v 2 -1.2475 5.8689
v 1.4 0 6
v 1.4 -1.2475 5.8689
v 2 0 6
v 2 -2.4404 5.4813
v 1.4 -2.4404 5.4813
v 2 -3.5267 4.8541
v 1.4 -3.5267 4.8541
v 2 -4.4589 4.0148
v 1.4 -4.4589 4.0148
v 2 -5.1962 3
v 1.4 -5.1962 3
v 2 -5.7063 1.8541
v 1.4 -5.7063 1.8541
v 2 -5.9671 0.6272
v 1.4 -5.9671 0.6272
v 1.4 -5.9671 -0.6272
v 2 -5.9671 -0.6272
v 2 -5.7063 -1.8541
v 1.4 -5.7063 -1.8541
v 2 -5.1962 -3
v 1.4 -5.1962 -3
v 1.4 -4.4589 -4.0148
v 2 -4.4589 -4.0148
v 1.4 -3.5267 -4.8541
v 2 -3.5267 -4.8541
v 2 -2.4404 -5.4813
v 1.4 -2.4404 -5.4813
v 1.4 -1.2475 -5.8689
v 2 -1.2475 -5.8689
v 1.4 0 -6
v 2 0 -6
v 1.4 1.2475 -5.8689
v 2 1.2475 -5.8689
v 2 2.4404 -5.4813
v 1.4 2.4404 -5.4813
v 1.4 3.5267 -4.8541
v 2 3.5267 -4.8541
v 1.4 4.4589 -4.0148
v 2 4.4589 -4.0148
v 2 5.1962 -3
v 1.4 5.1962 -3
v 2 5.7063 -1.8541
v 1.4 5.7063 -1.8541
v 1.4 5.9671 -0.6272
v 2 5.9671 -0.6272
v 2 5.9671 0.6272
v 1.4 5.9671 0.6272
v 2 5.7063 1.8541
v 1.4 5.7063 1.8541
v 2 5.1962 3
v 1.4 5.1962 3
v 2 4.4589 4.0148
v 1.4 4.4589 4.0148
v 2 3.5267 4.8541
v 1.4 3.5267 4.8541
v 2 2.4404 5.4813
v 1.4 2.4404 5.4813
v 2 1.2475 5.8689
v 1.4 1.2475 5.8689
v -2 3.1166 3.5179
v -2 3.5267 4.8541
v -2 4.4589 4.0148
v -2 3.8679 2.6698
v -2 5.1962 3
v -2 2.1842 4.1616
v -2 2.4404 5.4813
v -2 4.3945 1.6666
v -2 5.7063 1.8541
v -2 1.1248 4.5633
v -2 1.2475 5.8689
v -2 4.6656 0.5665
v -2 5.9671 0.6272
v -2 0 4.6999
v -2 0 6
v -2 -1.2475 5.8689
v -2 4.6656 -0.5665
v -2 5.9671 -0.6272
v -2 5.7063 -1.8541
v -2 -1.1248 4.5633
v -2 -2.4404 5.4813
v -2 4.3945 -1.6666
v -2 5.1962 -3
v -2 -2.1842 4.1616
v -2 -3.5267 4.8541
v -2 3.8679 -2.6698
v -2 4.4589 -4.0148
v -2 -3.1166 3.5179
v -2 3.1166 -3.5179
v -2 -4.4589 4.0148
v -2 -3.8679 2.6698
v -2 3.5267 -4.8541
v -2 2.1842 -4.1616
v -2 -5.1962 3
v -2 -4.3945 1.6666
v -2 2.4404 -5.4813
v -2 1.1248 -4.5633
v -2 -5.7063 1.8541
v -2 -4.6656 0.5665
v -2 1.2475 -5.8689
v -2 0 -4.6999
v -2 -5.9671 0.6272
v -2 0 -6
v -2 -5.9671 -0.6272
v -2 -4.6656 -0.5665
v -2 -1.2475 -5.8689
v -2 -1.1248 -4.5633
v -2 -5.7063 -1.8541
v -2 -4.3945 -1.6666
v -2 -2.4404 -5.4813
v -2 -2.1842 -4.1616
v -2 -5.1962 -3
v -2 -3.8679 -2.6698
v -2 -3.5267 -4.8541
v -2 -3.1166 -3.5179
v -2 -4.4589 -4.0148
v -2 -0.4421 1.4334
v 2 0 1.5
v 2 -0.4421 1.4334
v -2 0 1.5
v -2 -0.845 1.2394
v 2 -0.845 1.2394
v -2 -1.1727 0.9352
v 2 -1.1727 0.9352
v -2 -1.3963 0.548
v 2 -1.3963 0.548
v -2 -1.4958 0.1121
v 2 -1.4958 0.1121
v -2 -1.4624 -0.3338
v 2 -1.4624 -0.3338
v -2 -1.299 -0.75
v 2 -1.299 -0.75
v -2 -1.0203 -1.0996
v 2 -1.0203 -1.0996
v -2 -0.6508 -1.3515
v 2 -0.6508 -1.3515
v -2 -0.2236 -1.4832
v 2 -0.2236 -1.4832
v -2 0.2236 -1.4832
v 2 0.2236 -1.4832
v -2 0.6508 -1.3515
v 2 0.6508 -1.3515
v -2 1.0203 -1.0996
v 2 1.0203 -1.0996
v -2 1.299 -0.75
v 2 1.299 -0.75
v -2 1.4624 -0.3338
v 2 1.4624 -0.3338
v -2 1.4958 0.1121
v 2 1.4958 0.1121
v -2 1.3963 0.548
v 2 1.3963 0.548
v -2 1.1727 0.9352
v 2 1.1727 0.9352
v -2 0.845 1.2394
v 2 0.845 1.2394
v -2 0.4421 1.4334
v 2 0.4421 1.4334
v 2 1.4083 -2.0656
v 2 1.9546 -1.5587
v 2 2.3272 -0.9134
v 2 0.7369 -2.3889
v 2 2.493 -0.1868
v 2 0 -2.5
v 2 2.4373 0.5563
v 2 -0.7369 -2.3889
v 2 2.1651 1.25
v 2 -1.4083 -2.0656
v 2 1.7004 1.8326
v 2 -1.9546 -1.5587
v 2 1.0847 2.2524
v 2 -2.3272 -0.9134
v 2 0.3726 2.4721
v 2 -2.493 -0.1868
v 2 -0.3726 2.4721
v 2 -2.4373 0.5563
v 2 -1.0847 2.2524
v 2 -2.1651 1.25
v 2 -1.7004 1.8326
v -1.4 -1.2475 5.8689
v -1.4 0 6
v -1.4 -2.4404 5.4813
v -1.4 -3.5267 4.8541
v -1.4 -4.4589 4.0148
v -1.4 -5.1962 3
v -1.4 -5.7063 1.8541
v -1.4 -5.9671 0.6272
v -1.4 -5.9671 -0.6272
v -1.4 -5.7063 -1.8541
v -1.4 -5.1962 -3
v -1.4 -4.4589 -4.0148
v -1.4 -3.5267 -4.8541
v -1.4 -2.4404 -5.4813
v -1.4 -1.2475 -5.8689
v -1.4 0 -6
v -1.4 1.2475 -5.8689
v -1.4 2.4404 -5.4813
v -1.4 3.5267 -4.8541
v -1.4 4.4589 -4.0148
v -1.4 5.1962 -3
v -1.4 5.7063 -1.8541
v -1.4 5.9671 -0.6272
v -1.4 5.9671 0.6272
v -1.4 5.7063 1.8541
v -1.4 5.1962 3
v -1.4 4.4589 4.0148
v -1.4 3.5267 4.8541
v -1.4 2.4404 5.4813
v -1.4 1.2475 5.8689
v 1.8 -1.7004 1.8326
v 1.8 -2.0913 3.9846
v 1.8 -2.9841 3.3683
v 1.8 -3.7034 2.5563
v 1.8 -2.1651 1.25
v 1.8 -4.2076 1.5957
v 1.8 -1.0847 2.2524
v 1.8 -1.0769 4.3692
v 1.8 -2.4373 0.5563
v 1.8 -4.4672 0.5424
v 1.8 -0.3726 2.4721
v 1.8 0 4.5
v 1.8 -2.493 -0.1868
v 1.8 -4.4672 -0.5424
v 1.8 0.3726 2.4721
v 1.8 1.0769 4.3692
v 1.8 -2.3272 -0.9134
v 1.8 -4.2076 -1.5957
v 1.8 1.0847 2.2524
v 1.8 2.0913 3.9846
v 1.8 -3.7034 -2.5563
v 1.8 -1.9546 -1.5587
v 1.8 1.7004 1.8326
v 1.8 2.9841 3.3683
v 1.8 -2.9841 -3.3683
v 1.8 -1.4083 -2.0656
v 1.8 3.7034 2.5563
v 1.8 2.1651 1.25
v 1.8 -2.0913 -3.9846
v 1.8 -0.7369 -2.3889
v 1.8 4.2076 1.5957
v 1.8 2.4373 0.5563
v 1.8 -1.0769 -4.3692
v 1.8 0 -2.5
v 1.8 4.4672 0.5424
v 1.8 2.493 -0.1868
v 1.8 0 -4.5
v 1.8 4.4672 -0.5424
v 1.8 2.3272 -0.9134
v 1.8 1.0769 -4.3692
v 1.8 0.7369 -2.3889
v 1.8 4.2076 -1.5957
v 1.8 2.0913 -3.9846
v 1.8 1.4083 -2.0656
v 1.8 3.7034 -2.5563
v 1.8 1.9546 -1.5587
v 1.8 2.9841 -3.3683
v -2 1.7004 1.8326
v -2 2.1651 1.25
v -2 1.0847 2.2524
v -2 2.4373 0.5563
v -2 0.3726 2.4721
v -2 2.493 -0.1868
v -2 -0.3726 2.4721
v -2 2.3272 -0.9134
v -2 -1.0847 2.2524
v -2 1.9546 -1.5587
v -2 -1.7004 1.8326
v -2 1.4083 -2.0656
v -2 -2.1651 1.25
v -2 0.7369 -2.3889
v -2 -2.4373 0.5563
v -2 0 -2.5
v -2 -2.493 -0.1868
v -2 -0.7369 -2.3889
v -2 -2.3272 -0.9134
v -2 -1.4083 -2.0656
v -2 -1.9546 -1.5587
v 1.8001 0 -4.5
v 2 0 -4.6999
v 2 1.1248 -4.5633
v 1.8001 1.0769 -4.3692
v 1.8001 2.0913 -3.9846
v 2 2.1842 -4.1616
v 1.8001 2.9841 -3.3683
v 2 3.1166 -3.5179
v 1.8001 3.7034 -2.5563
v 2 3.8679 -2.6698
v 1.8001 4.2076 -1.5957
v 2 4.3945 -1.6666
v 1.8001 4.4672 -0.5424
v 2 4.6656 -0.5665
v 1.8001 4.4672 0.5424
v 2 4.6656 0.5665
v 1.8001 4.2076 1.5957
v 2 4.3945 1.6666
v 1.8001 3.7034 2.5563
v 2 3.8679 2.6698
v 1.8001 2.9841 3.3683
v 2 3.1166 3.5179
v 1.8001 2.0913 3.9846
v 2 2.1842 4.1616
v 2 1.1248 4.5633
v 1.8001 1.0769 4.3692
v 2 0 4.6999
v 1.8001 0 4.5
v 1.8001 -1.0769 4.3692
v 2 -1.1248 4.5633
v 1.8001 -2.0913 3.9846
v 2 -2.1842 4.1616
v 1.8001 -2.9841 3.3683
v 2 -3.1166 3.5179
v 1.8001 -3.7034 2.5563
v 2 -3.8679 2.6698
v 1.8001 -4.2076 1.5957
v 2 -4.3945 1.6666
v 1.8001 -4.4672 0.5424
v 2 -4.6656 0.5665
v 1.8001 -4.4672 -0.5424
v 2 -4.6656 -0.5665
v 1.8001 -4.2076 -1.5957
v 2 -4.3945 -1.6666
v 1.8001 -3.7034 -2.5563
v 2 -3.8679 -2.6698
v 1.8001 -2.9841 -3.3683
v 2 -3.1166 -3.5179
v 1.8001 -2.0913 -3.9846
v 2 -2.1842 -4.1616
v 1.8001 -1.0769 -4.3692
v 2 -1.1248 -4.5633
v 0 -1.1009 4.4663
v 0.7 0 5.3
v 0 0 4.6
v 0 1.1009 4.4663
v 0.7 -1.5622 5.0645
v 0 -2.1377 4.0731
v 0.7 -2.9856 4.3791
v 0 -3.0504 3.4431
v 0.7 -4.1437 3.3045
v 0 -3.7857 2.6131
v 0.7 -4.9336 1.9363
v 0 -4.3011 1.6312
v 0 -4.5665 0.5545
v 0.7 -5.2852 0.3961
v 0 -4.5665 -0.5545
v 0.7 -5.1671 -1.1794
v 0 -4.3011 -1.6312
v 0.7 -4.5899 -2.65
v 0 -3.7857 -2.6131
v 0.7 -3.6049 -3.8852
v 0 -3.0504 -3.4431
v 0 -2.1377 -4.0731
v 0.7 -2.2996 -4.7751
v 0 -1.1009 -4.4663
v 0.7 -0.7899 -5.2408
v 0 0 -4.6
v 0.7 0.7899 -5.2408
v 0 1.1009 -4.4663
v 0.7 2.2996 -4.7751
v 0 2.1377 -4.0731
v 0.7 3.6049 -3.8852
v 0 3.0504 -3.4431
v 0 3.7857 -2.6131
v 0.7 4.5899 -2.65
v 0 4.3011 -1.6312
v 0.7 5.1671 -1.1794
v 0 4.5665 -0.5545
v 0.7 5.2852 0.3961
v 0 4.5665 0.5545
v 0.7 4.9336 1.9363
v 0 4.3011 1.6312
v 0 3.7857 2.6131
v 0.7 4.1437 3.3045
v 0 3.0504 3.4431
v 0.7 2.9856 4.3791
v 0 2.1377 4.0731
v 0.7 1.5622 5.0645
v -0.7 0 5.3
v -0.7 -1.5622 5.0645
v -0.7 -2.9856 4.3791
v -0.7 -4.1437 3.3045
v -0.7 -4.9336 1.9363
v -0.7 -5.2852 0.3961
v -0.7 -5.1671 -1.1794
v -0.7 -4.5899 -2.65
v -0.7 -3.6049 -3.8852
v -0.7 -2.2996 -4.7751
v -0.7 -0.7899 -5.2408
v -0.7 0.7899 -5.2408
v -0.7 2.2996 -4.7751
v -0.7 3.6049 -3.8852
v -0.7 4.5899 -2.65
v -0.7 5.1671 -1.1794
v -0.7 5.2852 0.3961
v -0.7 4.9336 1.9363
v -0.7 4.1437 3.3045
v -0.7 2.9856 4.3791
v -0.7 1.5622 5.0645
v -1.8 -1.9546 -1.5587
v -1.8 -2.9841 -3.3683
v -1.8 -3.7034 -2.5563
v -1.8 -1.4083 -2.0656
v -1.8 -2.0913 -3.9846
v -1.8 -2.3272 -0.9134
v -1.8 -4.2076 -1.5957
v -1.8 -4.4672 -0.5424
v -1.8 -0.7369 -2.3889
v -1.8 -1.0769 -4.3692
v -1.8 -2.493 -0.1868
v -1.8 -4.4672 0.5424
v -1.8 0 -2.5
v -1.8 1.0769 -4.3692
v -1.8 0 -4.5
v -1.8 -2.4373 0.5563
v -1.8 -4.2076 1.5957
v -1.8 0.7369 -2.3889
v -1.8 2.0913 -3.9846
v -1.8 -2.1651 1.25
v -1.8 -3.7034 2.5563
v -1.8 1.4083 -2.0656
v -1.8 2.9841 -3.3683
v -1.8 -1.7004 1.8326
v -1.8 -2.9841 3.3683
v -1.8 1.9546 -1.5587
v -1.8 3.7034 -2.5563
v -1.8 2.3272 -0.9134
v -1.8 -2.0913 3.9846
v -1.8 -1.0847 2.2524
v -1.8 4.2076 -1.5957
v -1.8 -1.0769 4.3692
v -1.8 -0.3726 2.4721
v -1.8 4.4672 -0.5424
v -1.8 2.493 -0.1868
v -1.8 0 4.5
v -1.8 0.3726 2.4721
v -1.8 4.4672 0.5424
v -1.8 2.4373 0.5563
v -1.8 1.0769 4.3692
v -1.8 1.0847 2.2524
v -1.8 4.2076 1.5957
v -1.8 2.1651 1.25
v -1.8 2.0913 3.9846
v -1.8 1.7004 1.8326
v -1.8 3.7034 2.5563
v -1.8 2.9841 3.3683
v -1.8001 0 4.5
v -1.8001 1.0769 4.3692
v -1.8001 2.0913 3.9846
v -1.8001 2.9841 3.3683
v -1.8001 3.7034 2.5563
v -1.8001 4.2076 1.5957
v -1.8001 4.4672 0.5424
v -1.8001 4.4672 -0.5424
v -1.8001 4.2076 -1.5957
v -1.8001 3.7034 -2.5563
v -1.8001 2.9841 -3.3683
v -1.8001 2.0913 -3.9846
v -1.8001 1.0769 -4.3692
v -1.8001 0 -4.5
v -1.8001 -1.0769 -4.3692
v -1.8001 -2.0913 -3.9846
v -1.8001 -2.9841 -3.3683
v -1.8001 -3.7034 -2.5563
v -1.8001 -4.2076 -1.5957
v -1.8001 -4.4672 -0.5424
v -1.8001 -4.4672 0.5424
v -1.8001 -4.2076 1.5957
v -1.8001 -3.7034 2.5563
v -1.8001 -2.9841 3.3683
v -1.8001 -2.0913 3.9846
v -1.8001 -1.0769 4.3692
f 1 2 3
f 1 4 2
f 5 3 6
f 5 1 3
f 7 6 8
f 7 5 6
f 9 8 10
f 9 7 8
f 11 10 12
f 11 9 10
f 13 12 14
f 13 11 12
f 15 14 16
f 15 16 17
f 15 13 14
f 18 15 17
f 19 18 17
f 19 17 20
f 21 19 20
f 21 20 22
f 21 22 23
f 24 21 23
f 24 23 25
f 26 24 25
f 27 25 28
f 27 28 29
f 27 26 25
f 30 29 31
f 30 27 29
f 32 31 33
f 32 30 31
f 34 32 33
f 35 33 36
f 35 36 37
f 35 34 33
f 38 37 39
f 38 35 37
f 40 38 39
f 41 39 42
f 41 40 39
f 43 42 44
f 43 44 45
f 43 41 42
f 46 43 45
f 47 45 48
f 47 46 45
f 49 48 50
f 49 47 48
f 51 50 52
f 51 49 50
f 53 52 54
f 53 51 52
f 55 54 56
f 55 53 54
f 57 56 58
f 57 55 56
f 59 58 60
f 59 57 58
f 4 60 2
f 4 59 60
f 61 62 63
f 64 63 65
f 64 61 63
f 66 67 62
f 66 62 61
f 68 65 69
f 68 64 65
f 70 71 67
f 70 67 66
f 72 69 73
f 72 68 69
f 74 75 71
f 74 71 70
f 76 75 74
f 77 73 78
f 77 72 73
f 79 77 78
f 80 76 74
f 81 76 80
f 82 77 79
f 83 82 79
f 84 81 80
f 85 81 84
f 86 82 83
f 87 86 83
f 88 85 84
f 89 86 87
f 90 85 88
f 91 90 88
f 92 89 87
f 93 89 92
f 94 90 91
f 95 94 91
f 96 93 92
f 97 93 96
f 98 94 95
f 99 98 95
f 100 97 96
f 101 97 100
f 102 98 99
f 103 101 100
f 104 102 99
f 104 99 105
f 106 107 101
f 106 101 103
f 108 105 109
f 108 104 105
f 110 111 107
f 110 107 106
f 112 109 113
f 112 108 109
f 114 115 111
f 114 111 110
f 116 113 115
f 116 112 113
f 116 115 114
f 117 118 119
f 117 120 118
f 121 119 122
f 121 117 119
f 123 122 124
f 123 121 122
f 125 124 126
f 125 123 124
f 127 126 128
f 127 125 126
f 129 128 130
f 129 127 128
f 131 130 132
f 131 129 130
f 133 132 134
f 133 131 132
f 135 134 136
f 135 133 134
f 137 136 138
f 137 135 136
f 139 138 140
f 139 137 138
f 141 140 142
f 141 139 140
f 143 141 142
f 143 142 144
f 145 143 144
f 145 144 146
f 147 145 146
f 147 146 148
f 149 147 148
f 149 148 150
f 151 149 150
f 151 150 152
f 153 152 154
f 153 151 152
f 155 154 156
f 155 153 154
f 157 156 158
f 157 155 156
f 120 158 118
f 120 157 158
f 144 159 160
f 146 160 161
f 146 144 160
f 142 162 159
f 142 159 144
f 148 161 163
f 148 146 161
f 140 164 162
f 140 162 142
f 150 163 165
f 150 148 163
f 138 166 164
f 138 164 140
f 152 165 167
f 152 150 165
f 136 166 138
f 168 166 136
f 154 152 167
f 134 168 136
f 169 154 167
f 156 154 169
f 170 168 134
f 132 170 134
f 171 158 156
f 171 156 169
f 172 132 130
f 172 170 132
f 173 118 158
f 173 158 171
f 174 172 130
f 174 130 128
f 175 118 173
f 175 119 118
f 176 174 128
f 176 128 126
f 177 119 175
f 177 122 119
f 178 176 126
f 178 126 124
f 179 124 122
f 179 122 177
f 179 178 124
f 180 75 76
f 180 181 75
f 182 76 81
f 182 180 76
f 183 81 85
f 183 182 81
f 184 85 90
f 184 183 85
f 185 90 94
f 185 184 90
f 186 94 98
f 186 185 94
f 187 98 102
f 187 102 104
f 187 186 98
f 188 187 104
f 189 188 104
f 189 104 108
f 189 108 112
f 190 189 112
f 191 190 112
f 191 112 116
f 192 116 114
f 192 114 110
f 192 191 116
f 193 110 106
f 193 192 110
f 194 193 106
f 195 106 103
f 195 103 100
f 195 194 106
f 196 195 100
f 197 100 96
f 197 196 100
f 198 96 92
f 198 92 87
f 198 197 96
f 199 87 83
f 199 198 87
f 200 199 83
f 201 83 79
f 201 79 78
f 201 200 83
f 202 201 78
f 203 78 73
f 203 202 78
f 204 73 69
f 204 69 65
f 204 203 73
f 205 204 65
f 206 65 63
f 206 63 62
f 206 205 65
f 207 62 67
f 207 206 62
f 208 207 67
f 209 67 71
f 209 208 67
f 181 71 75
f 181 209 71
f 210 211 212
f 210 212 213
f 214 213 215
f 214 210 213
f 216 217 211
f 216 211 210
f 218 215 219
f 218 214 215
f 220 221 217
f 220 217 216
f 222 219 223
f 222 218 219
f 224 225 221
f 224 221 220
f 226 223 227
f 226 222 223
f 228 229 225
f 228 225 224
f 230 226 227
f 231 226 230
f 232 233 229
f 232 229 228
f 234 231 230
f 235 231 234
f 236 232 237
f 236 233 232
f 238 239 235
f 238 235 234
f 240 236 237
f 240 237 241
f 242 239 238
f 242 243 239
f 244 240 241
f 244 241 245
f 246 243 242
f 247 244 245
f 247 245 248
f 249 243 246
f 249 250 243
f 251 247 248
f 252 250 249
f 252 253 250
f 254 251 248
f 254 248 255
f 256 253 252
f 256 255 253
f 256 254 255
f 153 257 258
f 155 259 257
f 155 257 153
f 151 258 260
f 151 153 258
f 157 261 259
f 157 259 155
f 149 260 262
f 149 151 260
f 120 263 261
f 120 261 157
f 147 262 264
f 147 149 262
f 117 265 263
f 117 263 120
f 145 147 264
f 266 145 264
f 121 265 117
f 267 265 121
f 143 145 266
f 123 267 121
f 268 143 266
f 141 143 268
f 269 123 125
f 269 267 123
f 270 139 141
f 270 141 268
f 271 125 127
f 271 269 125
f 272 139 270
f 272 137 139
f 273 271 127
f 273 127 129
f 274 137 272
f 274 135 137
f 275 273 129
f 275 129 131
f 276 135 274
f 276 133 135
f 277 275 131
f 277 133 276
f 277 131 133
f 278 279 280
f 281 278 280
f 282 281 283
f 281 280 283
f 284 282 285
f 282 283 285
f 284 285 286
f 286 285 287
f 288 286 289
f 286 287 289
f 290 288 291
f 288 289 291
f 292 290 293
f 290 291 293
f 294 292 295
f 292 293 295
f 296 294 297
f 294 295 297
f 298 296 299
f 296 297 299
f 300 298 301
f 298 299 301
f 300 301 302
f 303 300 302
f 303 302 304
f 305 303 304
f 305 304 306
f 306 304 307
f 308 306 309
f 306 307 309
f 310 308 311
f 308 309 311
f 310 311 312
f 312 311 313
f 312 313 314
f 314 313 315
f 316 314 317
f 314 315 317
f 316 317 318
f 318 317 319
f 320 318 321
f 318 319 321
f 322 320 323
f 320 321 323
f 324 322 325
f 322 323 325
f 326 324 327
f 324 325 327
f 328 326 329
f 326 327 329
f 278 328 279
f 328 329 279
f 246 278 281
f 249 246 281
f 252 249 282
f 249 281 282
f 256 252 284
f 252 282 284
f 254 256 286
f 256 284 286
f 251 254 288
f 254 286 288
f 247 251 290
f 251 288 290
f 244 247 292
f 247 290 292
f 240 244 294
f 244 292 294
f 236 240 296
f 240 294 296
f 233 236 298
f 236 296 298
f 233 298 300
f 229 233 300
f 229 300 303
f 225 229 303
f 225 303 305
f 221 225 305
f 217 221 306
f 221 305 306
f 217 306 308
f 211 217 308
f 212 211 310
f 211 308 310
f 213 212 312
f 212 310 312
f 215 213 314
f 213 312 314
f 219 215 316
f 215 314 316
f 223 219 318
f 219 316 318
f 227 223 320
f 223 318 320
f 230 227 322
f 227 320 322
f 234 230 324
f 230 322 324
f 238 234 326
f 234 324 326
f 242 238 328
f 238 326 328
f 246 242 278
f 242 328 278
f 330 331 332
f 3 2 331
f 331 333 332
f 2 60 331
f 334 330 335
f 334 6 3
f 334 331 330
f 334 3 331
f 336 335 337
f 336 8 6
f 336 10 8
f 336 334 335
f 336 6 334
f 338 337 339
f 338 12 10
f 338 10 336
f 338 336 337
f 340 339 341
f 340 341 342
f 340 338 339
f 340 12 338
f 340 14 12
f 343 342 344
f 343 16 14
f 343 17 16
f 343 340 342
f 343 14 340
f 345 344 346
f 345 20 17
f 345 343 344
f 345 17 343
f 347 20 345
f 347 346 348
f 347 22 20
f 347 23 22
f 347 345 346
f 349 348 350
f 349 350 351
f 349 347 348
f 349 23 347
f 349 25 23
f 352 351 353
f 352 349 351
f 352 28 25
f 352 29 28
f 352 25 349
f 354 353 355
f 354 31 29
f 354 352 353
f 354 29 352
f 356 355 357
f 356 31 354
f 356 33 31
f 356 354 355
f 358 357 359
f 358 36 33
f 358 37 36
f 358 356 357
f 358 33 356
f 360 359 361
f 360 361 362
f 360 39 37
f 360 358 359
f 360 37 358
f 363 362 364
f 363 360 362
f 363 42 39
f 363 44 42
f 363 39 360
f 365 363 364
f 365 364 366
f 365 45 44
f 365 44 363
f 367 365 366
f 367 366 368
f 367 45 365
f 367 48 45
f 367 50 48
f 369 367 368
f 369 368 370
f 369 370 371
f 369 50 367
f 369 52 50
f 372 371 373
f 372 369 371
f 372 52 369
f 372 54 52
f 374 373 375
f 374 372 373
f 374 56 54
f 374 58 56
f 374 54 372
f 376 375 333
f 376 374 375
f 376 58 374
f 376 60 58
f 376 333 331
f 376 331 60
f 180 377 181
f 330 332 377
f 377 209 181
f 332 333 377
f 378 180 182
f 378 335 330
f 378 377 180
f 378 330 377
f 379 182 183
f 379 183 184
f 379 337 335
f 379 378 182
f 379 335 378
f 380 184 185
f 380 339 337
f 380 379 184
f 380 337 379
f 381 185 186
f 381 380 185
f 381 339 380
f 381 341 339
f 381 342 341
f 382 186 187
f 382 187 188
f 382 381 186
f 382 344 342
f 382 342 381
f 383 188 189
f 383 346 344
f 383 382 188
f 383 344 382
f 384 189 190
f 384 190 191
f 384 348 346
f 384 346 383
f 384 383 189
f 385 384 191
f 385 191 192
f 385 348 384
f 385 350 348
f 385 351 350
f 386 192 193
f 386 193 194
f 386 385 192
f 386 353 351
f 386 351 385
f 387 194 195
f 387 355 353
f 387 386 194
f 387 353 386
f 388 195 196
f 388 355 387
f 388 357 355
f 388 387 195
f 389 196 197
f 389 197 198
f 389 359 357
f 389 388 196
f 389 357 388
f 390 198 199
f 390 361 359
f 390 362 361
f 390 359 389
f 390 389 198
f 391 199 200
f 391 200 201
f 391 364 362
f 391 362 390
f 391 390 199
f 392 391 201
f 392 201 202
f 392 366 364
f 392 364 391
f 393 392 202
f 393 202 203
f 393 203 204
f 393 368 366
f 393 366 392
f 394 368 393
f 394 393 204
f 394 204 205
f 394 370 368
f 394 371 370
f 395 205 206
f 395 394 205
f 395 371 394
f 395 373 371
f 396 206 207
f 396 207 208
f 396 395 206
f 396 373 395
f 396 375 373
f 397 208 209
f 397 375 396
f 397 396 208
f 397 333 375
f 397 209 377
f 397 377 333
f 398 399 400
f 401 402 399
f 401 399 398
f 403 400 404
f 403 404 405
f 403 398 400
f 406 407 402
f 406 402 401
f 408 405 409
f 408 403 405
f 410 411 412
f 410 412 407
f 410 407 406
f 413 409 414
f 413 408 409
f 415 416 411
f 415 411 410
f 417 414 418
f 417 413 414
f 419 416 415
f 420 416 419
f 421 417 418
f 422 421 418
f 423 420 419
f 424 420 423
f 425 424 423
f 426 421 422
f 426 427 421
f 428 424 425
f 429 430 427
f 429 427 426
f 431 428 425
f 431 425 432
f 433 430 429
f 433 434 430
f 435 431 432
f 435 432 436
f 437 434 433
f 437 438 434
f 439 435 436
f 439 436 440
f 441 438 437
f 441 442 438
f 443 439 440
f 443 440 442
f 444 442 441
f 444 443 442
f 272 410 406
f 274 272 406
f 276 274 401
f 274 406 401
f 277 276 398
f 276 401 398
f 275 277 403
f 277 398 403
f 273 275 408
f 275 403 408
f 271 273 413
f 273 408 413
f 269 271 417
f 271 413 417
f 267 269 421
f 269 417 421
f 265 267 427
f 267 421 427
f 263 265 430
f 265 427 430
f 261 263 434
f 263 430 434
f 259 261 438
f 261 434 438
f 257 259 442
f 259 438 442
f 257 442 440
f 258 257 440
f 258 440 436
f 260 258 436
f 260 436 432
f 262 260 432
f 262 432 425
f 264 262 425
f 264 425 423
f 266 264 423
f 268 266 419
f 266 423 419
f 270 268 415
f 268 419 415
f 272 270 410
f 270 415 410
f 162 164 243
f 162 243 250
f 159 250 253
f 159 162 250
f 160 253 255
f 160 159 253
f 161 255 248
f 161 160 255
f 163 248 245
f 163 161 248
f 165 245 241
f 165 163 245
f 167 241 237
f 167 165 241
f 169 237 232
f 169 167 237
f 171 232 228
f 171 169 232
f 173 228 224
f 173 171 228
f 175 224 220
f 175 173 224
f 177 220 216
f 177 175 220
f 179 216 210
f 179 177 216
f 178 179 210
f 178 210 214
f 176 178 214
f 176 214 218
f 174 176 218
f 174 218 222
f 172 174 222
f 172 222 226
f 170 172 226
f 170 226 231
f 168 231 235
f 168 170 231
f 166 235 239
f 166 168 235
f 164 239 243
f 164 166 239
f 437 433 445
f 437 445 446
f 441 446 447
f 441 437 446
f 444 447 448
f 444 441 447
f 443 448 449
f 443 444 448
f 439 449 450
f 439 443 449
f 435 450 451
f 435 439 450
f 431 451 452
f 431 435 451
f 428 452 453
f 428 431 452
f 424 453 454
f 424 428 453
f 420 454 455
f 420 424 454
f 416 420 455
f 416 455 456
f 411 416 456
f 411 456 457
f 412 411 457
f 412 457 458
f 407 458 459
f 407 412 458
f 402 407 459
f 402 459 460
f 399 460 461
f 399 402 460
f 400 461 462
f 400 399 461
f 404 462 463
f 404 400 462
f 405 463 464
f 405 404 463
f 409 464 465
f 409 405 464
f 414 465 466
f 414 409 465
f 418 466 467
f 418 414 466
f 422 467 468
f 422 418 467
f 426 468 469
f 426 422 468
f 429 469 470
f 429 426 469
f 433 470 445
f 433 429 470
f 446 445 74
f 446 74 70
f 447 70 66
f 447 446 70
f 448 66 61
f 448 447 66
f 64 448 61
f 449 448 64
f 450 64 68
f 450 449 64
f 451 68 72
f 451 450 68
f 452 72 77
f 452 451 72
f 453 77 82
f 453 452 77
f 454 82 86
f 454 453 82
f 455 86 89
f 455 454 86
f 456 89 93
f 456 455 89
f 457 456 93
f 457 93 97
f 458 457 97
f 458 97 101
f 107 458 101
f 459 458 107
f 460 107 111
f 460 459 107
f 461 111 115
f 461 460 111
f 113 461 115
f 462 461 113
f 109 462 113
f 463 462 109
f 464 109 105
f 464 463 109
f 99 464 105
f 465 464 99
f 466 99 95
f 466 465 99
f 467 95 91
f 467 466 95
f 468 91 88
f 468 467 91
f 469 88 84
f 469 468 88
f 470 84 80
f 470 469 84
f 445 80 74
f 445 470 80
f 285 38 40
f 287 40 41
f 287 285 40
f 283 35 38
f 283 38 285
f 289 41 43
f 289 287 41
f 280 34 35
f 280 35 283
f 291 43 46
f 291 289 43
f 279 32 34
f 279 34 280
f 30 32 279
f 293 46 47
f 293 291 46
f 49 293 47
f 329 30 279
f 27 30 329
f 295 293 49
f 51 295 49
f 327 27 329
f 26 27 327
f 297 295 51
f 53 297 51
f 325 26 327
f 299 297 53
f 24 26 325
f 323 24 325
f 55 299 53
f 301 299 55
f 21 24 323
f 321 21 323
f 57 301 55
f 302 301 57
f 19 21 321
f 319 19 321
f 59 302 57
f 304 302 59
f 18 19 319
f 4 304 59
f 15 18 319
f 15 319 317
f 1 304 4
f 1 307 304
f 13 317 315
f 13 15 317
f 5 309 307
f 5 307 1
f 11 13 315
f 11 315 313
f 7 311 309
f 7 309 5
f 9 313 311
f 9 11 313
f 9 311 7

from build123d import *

# Parameters (mm, degrees)
SKETCH_2_R          = 4.5
SKETCH_2_R_2        = 2.5
CUT_EXTRUDE_1_DEPTH = 0.2
CHAMFER_1_SIZE      = 0.2
CUT_EXTRUDE_START   = -0.2
SKETCH_3_R          = 4.5
SKETCH_3_R_2        = 2.5
CUT_EXTRUDE_2_DEPTH = 0.2
CHAMFER_2_SIZE      = 0.2


with BuildPart() as part:
    # 草图1 → 旋转1 (revolve)
    with BuildSketch(Plane.XY, mode=Mode.PRIVATE) as revolve_1_sk:
        Polygon((-2, 1.5), (-2, 6), (-1.4, 6), (0, 4.6), (1.4, 6), (2, 6), (2, 1.5), align=None)
    revolve(revolve_1_sk.sketch.rotate(Axis((-2, 0, 0), (1, 0, 0)), 90), axis=Axis((-2, 0, 0), (1, 0, 0)))

    # 草图2 → 切除-拉伸1 (cut)
    with BuildSketch(Plane(origin=(2, 0, 0), x_dir=(0, 0, -1), z_dir=(1, 0, 0))):
        Circle(SKETCH_2_R)
        Circle(SKETCH_2_R_2, mode=Mode.SUBTRACT)
    extrude(amount=-CUT_EXTRUDE_1_DEPTH, mode=Mode.SUBTRACT)

    # 倒角1
    chamfer_1_edges = [part.edges().sort_by_distance(p)[0] for p in [
        (2, 0, 4.5),
    ]]
    chamfer(chamfer_1_edges, length=CHAMFER_1_SIZE - 0.0001)  # a hair under: the kernel refuses the full size

    # 草图3 → 切除-拉伸2 (cut)
    with BuildSketch(Plane.ZY.offset(2).offset(CUT_EXTRUDE_START)):
        Circle(SKETCH_3_R)
        with Locations(Location((0, 0, 0), (0, 0, 180))):
            Circle(SKETCH_3_R_2, mode=Mode.SUBTRACT)
    extrude(amount=CUT_EXTRUDE_2_DEPTH, mode=Mode.SUBTRACT)

    # 倒角2
    chamfer_2_edges = [part.edges().sort_by_distance(p)[0] for p in [
        (-2, 0, -4.5),
    ]]
    chamfer(chamfer_2_edges, length=CHAMFER_2_SIZE - 0.0001)  # a hair under: the kernel refuses the full size


solid = part.part
